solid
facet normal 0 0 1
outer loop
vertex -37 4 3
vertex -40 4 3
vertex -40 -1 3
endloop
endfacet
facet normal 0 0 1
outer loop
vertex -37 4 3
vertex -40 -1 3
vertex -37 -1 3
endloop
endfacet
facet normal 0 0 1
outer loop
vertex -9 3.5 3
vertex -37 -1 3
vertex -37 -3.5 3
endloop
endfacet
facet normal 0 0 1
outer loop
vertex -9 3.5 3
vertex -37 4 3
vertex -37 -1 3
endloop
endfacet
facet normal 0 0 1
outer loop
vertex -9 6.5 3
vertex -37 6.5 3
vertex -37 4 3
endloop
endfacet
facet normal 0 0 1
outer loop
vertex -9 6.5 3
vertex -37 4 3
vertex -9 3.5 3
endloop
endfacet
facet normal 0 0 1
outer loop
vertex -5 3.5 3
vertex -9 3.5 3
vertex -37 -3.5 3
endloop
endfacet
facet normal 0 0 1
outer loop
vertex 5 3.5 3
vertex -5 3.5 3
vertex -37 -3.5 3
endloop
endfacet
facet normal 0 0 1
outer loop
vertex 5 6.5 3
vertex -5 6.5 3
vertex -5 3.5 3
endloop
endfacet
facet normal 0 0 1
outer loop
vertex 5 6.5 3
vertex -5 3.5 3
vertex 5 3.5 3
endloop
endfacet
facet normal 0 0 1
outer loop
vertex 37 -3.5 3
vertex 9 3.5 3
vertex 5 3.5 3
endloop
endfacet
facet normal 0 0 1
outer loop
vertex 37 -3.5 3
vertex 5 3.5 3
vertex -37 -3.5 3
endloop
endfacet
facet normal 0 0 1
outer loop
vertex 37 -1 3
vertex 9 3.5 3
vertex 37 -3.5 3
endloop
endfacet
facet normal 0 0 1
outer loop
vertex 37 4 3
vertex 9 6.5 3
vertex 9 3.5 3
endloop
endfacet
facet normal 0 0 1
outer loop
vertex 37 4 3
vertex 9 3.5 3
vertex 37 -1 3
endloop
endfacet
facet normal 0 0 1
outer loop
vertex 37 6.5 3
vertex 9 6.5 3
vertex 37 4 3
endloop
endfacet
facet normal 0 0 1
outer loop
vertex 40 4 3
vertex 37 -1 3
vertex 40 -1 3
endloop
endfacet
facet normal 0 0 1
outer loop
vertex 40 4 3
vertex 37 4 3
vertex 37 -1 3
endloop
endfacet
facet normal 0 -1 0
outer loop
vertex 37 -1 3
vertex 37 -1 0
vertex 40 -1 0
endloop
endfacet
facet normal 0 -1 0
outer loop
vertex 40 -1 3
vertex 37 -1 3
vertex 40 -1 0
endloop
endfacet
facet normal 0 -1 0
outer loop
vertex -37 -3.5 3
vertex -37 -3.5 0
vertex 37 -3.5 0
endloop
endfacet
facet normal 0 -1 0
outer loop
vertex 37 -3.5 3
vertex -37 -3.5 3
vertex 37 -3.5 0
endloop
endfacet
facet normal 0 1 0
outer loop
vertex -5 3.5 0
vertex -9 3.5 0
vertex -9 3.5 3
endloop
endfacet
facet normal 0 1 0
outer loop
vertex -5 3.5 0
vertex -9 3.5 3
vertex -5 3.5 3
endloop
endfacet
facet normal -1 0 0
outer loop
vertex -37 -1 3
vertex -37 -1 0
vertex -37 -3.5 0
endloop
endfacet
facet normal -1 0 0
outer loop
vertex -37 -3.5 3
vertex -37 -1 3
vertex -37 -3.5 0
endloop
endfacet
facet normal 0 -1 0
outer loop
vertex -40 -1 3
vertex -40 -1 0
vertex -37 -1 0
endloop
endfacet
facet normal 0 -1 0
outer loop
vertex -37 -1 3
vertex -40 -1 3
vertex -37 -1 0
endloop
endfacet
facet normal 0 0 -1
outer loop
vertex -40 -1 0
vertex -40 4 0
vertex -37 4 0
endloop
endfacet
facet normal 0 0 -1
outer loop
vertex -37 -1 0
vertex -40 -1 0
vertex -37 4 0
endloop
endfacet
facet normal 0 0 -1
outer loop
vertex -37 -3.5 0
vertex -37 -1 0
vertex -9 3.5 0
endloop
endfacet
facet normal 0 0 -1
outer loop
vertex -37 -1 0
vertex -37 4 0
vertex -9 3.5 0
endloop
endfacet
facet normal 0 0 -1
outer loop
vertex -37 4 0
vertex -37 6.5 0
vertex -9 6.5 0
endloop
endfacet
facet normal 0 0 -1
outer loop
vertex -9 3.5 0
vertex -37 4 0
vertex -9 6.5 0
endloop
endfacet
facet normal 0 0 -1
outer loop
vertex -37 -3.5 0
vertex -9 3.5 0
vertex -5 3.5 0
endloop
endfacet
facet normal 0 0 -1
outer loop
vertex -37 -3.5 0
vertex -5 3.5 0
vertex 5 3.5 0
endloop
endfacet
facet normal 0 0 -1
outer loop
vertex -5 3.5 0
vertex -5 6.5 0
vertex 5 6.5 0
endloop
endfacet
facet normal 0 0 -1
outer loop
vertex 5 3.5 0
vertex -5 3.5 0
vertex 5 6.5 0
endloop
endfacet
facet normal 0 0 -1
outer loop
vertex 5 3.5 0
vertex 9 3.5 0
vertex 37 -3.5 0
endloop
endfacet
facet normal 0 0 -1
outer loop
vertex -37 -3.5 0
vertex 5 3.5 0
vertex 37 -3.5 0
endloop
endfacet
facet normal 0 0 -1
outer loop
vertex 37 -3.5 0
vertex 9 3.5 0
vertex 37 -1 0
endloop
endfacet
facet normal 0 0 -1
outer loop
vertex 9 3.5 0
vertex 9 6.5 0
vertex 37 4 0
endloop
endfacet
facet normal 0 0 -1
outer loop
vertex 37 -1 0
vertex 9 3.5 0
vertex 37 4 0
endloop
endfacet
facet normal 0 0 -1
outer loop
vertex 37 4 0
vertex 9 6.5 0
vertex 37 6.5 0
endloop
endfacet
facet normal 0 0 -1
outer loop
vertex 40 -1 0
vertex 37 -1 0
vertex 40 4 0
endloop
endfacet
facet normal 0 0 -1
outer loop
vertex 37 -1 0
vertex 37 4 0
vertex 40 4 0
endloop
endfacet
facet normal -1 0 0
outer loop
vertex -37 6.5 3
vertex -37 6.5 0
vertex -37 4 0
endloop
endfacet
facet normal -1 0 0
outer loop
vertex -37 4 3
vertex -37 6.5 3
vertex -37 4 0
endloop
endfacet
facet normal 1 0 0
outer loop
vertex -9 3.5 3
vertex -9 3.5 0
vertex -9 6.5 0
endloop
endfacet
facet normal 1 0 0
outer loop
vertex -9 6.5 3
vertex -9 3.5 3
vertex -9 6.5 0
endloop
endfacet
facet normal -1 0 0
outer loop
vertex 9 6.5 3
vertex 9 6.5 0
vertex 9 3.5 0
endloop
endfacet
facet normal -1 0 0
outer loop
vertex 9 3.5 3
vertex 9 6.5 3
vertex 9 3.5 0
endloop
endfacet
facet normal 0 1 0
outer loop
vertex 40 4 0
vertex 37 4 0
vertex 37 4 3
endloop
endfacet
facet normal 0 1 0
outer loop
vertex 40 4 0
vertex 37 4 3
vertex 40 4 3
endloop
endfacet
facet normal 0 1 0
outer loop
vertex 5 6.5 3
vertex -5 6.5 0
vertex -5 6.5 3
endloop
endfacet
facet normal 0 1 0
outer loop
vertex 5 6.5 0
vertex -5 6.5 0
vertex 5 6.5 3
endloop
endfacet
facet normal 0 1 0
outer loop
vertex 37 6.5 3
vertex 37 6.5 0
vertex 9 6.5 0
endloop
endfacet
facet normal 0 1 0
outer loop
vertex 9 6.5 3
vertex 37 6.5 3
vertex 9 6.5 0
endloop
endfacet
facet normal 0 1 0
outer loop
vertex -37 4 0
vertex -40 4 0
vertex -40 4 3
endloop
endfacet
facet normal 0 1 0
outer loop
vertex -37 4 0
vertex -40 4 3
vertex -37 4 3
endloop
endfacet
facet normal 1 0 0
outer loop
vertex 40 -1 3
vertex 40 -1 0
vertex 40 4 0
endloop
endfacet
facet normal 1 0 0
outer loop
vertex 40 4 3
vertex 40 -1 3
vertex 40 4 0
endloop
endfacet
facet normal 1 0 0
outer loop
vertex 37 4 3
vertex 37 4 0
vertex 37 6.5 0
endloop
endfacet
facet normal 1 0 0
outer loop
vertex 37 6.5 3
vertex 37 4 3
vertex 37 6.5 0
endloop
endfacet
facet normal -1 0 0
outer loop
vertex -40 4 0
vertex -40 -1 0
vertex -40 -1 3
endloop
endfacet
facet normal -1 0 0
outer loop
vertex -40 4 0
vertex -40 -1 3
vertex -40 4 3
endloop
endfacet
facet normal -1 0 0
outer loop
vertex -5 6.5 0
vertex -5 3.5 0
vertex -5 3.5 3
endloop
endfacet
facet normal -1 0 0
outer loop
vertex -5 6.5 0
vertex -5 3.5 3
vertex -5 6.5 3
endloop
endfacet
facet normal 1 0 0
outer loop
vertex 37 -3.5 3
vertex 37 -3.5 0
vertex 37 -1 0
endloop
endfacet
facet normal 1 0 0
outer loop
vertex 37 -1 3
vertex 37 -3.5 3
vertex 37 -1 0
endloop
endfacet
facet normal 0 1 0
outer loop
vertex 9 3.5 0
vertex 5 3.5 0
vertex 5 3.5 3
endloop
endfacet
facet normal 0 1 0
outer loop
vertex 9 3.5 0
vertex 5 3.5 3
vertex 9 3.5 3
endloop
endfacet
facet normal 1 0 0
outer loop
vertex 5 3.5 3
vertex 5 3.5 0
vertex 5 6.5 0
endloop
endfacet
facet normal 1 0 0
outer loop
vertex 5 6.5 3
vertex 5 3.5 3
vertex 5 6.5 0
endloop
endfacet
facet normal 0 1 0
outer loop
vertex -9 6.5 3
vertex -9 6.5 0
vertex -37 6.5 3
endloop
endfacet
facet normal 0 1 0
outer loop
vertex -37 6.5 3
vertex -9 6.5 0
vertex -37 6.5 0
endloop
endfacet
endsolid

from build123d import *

# Parameters (mm, degrees)
SKETCH_1_W      = 74
SKETCH_1_H      = 7
SKETCH_1_W_2    = 10
SKETCH_1_H_2    = 3
SKETCH_1_W_3    = 3
SKETCH_1_H_3    = 5
EXTRUDE_1_DEPTH = 3


with BuildPart() as part:
    # 草圖1 → 填料-伸長1 (new body)
    with BuildSketch(Plane.XY):
        Polygon((-37, 4), (-37, 3.5), (-9, 3.5), (-9, 6.5), (-37, 6.5), align=None)
        Rectangle(SKETCH_1_W, SKETCH_1_H)
        with Locations((0, 5)):
            Rectangle(SKETCH_1_W_2, SKETCH_1_H_2)
        Polygon((9, 6.5), (9, 3.5), (37, 3.5), (37, 4), (37, 6.5), align=None)
        with Locations((-38.5, 1.5)):
            Rectangle(SKETCH_1_W_3, SKETCH_1_H_3)
        with Locations((38.5, 1.5)):
            Rectangle(SKETCH_1_W_3, SKETCH_1_H_3)
    extrude(amount=EXTRUDE_1_DEPTH)


solid = part.part
